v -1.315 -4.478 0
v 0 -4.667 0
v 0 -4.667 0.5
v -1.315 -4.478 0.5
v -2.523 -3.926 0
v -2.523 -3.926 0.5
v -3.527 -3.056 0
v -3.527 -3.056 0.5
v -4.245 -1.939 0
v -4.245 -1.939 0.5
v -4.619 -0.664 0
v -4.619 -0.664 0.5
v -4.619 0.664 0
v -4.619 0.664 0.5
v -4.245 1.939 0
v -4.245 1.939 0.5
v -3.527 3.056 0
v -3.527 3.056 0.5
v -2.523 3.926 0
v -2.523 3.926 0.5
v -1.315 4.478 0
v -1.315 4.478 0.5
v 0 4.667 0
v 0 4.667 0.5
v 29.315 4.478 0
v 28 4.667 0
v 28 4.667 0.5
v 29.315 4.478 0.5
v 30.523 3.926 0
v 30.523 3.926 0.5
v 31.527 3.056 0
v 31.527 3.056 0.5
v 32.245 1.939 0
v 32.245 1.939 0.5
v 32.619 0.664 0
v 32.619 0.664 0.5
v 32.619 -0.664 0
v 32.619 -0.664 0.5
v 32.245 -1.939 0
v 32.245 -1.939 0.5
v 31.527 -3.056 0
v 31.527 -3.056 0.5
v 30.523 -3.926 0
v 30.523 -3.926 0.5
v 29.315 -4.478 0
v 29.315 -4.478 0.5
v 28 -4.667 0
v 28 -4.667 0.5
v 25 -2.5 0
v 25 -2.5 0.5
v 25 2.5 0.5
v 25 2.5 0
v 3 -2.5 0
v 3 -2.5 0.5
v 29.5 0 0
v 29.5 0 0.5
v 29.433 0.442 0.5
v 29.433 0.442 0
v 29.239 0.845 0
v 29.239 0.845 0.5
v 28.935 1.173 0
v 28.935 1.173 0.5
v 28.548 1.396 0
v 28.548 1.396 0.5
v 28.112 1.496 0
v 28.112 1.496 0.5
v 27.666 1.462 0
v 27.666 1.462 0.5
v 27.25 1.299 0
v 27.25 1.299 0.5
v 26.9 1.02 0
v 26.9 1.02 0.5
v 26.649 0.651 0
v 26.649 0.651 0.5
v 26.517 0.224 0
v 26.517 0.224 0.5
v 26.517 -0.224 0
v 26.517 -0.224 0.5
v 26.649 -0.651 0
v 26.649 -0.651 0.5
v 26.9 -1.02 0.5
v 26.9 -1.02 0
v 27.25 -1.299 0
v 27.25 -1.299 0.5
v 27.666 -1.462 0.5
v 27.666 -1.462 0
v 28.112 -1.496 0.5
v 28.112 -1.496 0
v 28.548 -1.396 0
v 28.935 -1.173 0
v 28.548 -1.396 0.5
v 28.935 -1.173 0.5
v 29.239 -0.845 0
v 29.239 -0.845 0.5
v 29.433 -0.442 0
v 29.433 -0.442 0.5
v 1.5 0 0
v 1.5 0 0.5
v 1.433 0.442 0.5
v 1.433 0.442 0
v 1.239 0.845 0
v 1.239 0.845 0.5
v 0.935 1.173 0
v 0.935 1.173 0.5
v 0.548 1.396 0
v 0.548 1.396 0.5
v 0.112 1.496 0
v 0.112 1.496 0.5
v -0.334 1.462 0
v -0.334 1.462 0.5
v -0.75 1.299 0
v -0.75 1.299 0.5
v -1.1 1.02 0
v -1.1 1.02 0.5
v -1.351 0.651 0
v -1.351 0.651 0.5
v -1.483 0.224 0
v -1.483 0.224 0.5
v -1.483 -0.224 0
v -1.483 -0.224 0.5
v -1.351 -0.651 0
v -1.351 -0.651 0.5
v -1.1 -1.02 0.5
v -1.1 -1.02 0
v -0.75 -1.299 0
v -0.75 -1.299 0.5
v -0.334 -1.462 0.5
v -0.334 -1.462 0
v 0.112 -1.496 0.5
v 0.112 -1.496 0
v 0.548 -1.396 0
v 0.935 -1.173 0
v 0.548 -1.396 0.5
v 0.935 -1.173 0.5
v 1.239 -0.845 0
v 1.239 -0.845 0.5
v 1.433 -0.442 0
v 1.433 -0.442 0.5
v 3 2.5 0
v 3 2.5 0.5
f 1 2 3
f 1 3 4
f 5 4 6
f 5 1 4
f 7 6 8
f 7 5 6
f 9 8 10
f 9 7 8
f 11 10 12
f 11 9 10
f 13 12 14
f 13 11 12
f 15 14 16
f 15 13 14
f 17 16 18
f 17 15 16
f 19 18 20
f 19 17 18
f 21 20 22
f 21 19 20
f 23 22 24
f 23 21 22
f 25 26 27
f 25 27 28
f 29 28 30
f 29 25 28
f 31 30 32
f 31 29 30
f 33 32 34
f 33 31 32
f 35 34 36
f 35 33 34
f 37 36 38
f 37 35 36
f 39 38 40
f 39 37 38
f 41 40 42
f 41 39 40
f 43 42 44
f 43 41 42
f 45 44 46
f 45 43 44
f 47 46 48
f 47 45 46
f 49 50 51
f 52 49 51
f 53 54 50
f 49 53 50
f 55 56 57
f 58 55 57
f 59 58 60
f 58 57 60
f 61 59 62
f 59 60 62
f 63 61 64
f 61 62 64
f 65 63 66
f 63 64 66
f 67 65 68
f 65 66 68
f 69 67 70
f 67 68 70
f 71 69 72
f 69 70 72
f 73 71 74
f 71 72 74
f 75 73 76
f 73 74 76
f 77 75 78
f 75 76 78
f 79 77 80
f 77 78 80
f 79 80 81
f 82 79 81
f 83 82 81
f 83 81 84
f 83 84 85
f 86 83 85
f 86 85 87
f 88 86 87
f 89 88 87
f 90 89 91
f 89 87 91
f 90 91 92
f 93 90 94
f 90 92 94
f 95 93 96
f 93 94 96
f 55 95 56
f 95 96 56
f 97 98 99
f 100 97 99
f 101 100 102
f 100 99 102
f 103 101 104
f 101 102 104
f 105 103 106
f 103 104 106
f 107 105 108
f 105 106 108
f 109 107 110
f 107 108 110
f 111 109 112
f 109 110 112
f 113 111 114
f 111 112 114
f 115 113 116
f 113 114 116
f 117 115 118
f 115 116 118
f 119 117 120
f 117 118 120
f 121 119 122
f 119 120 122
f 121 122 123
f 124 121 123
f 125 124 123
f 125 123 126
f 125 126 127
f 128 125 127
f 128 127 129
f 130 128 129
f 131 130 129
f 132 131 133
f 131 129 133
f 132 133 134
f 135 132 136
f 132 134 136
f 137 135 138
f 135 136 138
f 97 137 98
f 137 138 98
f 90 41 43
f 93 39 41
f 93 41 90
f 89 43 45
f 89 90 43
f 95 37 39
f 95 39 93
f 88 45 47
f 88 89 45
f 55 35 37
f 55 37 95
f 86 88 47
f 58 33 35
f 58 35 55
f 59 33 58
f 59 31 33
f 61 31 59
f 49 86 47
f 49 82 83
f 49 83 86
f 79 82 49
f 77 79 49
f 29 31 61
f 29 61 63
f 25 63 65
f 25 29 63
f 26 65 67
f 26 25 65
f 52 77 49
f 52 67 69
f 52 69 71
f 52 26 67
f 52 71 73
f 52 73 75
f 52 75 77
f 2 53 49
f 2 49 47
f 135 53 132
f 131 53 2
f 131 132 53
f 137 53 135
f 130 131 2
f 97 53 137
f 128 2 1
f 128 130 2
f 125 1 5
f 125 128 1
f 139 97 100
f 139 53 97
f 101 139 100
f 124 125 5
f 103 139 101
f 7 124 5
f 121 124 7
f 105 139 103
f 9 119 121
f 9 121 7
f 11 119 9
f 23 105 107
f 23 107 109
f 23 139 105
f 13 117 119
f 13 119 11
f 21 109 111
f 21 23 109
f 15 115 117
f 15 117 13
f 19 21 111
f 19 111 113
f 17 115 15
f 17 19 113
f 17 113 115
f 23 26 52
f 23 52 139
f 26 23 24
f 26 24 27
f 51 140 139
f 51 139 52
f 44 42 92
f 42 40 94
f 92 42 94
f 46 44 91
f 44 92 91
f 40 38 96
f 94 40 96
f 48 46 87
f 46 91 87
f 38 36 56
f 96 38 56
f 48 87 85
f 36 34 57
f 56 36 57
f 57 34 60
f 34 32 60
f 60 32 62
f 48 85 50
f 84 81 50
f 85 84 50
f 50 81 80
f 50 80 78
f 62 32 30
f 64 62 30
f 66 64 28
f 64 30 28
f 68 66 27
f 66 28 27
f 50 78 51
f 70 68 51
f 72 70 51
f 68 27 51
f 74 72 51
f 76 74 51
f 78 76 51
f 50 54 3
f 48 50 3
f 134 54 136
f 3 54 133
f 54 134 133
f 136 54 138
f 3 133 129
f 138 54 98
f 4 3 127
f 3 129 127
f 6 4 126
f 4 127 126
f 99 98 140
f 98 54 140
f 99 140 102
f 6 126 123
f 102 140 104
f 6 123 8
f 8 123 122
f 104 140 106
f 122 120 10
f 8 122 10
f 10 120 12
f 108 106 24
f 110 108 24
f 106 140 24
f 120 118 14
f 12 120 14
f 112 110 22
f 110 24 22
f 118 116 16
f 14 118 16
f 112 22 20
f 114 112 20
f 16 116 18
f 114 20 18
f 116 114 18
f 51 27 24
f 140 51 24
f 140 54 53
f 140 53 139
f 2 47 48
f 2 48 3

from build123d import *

# Parameters (mm, degrees)
BOSS_EXTRUDE1_DEPTH = 0.5
SKETCH2_R           = 1.5
CUT_EXTRUDE1_DEPTH  = 0.5
SKETCH3_R           = 1.5
CUT_EXTRUDE2_DEPTH  = 0.5
SKETCH4_W           = 22
SKETCH4_H           = 5
CUT_EXTRUDE3_DEPTH  = 0.5


with BuildPart() as part:
    # Sketch1 → Boss-Extrude1 (new body)
    with BuildSketch(Plane.XY):
        with BuildLine():
            Line((0, 4.666666667), (28, 4.666666667))
            ThreePointArc((28, 4.666666667), (32.666666667, 0), (28, -4.666666667))
            Line((28, -4.666666667), (0, -4.666666667))
            ThreePointArc((0, -4.666666667), (-4.666666667, 0), (0, 4.666666667))
        make_face()
    extrude(amount=BOSS_EXTRUDE1_DEPTH)

    # Sketch2 → Cut-Extrude1 (cut)
    with BuildSketch(Plane.XY.offset(0.5)):
        Circle(SKETCH2_R)
    extrude(amount=-CUT_EXTRUDE1_DEPTH, mode=Mode.SUBTRACT)

    # Sketch3 → Cut-Extrude2 (cut)
    with BuildSketch(Plane.XY.offset(0.5)):
        with Locations((28, 0)):
            Circle(SKETCH3_R)
    extrude(amount=-CUT_EXTRUDE2_DEPTH, mode=Mode.SUBTRACT)

    # Sketch4 → Cut-Extrude3 (cut)
    with BuildSketch(Plane.XY.offset(0.5)):
        with Locations((14, 0)):
            Rectangle(SKETCH4_W, SKETCH4_H)
    extrude(amount=-CUT_EXTRUDE3_DEPTH, mode=Mode.SUBTRACT)


solid = part.part
